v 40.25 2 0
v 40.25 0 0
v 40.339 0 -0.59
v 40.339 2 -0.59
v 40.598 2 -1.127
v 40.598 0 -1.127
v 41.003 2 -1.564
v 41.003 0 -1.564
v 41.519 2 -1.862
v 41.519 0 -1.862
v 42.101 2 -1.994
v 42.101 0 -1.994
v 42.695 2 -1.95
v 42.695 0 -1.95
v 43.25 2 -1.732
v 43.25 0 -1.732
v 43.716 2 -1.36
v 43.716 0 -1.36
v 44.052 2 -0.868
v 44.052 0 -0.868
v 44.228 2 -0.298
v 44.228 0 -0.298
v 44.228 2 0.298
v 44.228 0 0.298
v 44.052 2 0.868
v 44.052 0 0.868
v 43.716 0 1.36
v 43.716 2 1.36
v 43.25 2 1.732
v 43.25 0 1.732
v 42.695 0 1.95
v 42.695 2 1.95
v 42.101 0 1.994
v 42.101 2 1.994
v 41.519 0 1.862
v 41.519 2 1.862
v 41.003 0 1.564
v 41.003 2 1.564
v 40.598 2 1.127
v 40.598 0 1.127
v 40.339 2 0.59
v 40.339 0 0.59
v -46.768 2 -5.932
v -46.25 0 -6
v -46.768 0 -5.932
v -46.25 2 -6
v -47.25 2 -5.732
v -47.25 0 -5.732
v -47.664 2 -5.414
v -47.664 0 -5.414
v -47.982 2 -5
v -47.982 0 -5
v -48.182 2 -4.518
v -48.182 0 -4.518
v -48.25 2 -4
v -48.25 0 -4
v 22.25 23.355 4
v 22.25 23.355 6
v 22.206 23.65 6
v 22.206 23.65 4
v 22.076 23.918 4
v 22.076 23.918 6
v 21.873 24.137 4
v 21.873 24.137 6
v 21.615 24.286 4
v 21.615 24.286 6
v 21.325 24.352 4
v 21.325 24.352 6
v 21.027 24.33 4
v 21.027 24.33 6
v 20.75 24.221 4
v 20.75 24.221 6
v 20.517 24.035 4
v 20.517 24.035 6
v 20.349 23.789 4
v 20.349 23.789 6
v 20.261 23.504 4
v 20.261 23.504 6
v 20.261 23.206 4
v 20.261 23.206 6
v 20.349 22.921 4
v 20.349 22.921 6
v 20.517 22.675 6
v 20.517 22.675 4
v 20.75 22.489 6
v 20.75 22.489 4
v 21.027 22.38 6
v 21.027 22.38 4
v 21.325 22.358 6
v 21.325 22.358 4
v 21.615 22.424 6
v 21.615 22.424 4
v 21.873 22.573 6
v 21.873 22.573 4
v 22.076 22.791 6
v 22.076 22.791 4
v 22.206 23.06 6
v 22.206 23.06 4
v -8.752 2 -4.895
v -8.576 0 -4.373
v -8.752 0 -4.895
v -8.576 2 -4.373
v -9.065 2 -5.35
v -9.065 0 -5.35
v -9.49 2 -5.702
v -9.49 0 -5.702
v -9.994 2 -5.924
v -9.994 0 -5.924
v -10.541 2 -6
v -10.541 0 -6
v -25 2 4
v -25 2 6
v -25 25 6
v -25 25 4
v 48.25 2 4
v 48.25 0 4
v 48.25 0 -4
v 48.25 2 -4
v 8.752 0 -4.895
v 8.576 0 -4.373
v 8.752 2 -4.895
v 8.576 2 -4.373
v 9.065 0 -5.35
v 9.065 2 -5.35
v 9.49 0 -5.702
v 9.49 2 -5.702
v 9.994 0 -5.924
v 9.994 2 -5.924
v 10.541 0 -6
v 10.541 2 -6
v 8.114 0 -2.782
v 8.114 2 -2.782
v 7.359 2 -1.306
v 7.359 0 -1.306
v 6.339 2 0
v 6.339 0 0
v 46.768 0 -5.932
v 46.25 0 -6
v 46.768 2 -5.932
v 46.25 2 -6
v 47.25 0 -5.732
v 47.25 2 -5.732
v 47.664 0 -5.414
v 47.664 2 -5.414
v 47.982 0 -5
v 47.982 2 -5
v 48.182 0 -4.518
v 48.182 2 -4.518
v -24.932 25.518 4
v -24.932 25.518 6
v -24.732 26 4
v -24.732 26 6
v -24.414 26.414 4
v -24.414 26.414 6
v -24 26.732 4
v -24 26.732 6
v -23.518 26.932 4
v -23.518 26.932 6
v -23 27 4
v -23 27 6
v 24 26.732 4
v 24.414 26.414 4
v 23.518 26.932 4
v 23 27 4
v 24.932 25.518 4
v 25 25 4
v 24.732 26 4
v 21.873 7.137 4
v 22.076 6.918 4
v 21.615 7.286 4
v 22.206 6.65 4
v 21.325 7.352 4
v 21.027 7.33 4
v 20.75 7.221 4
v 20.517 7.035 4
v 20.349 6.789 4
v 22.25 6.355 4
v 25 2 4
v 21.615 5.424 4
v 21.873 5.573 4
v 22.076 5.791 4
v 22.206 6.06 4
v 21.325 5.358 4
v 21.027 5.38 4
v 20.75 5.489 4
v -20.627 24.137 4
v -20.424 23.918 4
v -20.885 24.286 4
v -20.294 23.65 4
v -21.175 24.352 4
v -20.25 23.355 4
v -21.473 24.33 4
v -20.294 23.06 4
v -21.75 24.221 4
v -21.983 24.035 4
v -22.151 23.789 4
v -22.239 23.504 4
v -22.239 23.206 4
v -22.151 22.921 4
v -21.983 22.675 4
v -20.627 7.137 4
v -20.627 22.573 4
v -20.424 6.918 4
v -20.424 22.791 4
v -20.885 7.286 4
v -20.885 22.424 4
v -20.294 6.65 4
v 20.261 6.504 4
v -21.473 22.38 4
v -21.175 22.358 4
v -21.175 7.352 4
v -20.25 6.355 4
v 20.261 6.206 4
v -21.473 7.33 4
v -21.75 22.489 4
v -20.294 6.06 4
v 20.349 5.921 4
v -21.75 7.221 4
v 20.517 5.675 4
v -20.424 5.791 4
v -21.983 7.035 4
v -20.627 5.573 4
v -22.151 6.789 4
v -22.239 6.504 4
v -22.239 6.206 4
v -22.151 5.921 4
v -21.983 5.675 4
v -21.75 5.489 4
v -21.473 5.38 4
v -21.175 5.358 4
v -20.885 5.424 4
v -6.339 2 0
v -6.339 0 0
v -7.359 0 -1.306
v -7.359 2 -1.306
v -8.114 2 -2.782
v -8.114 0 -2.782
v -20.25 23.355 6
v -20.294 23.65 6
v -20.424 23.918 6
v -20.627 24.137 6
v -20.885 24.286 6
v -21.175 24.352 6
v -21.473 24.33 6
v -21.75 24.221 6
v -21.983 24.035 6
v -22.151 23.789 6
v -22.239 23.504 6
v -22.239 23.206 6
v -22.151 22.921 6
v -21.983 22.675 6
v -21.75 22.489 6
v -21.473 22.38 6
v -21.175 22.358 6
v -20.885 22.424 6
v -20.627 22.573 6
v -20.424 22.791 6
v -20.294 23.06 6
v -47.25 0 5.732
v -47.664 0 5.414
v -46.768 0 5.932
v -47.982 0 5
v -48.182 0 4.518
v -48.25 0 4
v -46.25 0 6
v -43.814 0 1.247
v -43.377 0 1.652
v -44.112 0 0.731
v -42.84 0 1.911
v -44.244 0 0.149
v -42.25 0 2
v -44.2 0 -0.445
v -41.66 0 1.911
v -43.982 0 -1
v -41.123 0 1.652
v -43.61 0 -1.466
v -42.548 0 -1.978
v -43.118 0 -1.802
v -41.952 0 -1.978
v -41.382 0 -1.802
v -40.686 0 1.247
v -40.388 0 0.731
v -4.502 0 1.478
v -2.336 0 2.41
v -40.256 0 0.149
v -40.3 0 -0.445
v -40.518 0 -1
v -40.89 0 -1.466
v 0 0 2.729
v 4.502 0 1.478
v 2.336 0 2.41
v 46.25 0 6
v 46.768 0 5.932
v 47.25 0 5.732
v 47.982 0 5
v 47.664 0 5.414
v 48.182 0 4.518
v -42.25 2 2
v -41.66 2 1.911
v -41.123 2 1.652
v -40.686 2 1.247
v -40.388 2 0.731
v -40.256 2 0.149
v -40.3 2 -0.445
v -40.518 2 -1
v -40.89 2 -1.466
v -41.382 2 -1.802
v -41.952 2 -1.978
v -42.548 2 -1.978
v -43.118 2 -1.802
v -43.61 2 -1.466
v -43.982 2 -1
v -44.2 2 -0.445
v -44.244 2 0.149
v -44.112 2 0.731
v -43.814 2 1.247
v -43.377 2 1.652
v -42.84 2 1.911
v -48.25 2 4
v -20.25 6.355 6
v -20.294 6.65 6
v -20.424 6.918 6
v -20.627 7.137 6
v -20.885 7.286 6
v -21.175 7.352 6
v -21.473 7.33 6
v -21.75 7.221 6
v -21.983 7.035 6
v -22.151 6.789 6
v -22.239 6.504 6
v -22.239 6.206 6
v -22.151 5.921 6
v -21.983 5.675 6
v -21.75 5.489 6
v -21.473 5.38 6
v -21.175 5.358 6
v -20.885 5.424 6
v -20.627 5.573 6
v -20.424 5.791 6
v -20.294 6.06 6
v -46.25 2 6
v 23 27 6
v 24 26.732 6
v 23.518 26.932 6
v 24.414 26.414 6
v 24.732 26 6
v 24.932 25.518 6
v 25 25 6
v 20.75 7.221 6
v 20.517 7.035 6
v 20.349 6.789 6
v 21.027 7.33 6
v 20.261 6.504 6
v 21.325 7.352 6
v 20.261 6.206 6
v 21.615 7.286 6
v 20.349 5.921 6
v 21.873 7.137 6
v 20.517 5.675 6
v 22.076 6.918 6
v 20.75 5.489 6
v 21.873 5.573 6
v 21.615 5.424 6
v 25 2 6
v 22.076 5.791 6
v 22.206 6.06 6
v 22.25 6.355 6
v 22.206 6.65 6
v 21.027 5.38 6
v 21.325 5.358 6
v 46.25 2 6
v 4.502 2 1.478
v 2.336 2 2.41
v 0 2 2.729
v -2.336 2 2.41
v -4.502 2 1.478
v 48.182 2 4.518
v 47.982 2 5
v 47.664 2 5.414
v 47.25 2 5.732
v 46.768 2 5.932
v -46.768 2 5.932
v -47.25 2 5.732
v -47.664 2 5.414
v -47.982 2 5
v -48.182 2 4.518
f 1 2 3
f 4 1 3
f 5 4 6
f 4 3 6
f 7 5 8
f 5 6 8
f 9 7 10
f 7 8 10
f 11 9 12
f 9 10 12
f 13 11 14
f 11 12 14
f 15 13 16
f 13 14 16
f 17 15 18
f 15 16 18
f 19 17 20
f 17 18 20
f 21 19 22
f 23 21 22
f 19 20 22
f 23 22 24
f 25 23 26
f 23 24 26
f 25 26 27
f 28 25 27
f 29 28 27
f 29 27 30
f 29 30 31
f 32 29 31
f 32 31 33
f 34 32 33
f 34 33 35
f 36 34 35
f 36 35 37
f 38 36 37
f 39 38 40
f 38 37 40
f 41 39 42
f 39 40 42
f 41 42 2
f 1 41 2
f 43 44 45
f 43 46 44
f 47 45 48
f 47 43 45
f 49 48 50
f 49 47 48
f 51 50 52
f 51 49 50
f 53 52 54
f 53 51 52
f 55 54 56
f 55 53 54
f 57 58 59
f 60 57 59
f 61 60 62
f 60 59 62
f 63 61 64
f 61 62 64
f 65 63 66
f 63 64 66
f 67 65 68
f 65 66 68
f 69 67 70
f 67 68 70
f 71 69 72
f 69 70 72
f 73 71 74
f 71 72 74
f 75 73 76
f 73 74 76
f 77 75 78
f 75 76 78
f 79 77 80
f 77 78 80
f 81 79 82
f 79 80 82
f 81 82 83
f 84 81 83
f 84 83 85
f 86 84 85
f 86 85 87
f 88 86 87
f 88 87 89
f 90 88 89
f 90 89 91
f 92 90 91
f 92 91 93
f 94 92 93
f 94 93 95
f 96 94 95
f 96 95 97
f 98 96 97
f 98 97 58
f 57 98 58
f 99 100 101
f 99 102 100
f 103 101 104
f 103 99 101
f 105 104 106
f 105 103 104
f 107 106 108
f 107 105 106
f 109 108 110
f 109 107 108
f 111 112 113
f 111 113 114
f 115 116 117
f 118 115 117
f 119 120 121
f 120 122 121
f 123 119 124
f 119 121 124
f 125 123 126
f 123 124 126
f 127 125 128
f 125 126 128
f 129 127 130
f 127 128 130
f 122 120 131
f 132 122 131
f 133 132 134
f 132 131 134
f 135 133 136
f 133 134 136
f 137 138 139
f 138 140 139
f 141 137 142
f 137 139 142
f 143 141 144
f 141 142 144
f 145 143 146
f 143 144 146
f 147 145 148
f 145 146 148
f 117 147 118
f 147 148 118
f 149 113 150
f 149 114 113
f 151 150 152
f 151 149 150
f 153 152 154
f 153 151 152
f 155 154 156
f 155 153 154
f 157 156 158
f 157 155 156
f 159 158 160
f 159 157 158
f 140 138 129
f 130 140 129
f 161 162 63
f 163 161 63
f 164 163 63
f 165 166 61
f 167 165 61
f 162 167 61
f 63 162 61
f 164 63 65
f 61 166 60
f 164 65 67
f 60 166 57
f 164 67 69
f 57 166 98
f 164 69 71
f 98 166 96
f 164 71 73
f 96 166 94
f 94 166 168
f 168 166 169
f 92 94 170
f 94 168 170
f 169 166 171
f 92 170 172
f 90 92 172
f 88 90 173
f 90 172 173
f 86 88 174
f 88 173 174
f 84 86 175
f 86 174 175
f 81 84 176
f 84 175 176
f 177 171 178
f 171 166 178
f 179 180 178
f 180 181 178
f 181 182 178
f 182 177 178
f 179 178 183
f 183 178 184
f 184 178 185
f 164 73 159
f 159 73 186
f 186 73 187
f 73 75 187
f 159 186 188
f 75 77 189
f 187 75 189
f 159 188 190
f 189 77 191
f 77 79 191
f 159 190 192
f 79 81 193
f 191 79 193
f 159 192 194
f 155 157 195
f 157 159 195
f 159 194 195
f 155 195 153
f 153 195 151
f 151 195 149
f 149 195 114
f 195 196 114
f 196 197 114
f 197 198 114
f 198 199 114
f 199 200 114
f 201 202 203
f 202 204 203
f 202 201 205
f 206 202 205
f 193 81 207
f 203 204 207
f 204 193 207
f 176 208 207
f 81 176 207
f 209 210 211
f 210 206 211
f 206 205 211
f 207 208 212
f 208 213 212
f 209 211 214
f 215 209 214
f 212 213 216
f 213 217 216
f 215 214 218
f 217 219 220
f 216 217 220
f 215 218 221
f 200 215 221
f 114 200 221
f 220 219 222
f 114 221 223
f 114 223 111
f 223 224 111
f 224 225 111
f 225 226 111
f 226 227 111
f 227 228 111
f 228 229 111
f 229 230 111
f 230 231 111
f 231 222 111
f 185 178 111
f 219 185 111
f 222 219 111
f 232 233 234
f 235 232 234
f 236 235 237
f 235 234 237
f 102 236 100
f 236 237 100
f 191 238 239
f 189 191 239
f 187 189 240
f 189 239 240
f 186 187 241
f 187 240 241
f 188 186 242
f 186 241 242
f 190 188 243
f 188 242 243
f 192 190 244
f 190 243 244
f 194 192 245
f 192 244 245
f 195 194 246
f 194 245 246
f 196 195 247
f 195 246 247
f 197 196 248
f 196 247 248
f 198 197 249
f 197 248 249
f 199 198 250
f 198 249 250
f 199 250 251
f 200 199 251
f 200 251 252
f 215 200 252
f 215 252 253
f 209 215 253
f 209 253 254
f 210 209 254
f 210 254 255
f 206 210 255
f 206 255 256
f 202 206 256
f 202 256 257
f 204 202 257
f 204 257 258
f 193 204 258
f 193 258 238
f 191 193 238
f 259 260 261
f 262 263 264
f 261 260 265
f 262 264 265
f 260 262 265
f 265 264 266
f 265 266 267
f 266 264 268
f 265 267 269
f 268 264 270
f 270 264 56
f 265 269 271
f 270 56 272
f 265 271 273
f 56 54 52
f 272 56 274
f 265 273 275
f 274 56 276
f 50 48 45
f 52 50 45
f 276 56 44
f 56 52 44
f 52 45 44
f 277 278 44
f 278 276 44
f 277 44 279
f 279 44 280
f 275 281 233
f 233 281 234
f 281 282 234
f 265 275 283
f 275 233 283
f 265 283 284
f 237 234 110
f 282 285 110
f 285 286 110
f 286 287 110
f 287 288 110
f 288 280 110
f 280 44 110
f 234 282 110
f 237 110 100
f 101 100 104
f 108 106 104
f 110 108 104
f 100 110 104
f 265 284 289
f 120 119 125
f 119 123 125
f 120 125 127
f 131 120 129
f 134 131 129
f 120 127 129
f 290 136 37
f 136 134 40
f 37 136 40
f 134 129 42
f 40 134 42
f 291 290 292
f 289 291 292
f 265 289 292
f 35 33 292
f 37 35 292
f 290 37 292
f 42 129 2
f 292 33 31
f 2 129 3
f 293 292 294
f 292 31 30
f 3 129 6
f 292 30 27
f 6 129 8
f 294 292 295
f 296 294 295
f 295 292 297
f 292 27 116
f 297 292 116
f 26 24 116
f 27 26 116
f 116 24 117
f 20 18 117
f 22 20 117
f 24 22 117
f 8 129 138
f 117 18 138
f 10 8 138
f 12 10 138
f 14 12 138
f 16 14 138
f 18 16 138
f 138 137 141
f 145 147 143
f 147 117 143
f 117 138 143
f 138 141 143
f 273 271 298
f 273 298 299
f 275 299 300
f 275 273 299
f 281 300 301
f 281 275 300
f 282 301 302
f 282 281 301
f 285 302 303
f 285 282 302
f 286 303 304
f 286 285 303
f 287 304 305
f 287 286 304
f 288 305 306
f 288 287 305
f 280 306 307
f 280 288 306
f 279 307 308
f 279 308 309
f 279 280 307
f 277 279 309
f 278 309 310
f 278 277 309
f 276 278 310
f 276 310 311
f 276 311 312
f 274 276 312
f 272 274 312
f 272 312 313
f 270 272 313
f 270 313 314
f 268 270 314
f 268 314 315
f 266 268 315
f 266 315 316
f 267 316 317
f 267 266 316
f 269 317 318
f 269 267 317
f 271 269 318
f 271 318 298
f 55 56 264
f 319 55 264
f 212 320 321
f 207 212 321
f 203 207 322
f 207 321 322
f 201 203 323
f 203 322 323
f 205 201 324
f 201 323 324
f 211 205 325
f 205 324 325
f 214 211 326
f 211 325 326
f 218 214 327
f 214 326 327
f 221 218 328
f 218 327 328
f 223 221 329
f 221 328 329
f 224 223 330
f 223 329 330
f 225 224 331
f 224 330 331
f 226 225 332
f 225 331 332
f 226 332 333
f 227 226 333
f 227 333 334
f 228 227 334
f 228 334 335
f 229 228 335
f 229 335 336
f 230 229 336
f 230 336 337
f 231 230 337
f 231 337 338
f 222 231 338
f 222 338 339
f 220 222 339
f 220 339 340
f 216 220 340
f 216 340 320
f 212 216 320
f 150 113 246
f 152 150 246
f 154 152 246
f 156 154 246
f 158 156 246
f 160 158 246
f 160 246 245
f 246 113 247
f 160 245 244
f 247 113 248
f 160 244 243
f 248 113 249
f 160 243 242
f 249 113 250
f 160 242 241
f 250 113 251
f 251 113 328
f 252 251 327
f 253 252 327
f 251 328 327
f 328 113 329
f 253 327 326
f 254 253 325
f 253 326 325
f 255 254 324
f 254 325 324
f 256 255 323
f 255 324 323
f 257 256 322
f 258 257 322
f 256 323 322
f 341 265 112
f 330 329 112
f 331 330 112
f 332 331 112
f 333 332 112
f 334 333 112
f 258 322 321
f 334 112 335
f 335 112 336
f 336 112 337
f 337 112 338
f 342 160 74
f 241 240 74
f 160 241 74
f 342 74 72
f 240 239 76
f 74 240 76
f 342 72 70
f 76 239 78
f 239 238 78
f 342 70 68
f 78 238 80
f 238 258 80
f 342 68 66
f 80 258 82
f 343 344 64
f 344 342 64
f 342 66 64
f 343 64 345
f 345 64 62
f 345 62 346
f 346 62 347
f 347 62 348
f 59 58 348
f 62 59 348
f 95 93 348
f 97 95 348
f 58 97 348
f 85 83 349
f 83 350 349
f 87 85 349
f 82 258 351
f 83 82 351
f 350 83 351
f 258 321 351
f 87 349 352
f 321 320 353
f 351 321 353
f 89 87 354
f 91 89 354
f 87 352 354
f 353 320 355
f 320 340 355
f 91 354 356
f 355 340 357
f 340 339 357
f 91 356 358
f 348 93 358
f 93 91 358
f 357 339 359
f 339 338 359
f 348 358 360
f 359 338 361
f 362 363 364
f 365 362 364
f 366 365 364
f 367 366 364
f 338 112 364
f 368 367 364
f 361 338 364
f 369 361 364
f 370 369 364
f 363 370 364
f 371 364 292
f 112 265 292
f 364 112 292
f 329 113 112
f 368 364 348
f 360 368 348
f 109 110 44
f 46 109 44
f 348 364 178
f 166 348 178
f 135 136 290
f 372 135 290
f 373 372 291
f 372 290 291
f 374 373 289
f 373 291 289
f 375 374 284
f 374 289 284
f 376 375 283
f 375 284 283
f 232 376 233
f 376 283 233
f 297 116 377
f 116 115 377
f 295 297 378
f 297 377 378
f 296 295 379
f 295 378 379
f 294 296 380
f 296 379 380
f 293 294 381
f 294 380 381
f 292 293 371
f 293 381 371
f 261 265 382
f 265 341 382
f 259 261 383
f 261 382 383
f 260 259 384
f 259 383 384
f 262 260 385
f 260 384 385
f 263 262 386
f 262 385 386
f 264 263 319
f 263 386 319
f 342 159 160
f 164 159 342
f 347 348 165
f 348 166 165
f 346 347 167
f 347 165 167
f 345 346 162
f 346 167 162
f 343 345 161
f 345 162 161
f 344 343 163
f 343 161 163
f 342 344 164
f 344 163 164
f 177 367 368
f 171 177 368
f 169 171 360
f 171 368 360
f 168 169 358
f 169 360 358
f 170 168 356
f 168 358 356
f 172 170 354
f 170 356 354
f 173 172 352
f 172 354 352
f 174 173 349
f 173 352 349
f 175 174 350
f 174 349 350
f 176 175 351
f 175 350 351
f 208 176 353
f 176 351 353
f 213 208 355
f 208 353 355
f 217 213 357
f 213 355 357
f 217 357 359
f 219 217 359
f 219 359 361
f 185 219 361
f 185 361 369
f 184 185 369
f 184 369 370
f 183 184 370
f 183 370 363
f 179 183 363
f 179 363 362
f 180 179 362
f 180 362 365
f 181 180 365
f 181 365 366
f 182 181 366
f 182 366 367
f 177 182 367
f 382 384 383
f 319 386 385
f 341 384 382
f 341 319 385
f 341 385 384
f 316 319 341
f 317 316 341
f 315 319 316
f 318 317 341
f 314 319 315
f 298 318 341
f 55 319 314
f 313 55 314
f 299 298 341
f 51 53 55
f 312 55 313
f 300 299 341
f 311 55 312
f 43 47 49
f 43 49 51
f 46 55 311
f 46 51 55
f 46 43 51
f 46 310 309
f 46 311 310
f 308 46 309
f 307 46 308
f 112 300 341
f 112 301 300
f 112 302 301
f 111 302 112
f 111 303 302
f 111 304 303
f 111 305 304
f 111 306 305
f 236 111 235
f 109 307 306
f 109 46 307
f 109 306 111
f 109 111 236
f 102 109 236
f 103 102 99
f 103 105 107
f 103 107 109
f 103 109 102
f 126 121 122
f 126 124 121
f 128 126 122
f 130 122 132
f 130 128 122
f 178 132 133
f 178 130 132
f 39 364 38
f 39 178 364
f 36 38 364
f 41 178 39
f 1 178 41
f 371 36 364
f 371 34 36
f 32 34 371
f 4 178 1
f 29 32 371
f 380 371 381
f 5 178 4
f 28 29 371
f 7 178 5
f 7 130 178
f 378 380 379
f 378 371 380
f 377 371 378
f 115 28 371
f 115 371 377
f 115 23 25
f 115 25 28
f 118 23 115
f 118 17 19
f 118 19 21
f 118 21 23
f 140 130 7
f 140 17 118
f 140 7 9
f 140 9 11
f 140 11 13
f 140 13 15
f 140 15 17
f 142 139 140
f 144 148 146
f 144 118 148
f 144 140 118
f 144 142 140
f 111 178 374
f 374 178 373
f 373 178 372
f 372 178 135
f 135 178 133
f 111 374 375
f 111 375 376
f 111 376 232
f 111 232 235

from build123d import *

# Parameters (mm, degrees)
SKETCH3_R           = 2
BOSS_EXTRUDE1_DEPTH = 2
SKETCH4_W           = 25
SKETCH4_H           = 2
BOSS_EXTRUDE2_DEPTH = 25
CUT_EXTRUDE1_REACH  = 58.578
SKETCH6_R           = 1
FILLET1_R           = 2


with BuildPart() as part:
    # Sketch3 → Boss-Extrude1 (new body)
    with BuildSketch(Plane(origin=(0, 0, 0), x_dir=(1, 0, 0), z_dir=(0, 1, 0))):
        with BuildLine():
            ThreePointArc((8.728627884, 6), (8.109373095, 2.770911469), (6.339475115, 0))
            ThreePointArc((6.339475115, 0), (0, -2.728627884), (-6.339475115, 0))
            ThreePointArc((-6.339475115, 0), (-8.109373095, 2.770911469), (-8.728627884, 6))
            Line((-8.728627884, 6), (-48.25, 6))
            Line((-48.25, 6), (-48.25, -6))
            Line((-48.25, -6), (48.25, -6))
            Line((48.25, -6), (48.25, 6))
            Line((48.25, 6), (8.728627884, 6))
        make_face()
        with Locations(Location((-42.25, 0, 0), (0, 0, 270))):
            Circle(SKETCH3_R, mode=Mode.SUBTRACT)
        with BuildLine():
            ThreePointArc((44.25, 0), (42.25, -2), (40.25, 0))
            ThreePointArc((40.25, 0), (42.25, 2), (44.25, 0))
        make_face(mode=Mode.SUBTRACT)
    extrude(amount=BOSS_EXTRUDE1_DEPTH)

    # Sketch4 → Boss-Extrude2 (add)
    with BuildSketch(Plane(origin=(0, 2, 0), x_dir=(1, 0, 0), z_dir=(0, 1, 0))):
        with Locations((-12.5, -5)):
            Rectangle(SKETCH4_W, SKETCH4_H)
        with Locations((12.5, -5)):
            Rectangle(SKETCH4_W, SKETCH4_H)
    extrude(amount=BOSS_EXTRUDE2_DEPTH)

    # Sketch6 → Cut-Extrude1 (cut, up to next)
    with BuildSketch(Plane.XY.offset(6), mode=Mode.PRIVATE) as cut_extrude1_sk1:
        with Locations((21.25, 23.354759591)):
            Circle(SKETCH6_R)
    cut_extrude1_tool1 = extrude(cut_extrude1_sk1.sketch, amount=-CUT_EXTRUDE1_REACH, mode=Mode.PRIVATE) & part.part
    # Sketch6 → Cut-Extrude1 (cut, up to next)
    with BuildSketch(Plane.XY.offset(6), mode=Mode.PRIVATE) as cut_extrude1_sk2:
        with Locations((-21.25, 23.354759591)):
            Circle(SKETCH6_R)
    cut_extrude1_tool2 = extrude(cut_extrude1_sk2.sketch, amount=-CUT_EXTRUDE1_REACH, mode=Mode.PRIVATE) & part.part
    # Sketch6 → Cut-Extrude1 (cut, up to next)
    with BuildSketch(Plane.XY.offset(6), mode=Mode.PRIVATE) as cut_extrude1_sk3:
        with Locations((21.25, 6.354759591)):
            Circle(SKETCH6_R)
    cut_extrude1_tool3 = extrude(cut_extrude1_sk3.sketch, amount=-CUT_EXTRUDE1_REACH, mode=Mode.PRIVATE) & part.part
    # Sketch6 → Cut-Extrude1 (cut, up to next)
    with BuildSketch(Plane.XY.offset(6), mode=Mode.PRIVATE) as cut_extrude1_sk4:
        with Locations((-21.25, 6.354759591)):
            Circle(SKETCH6_R)
    cut_extrude1_tool4 = extrude(cut_extrude1_sk4.sketch, amount=-CUT_EXTRUDE1_REACH, mode=Mode.PRIVATE) & part.part
    add(cut_extrude1_tool1.solids().sort_by_distance((21.25, 23.35476, 6))[0], mode=Mode.SUBTRACT)
    add(cut_extrude1_tool2.solids().sort_by_distance((-21.25, 23.35476, 6))[0], mode=Mode.SUBTRACT)
    add(cut_extrude1_tool3.solids().sort_by_distance((21.25, 6.35476, 6))[0], mode=Mode.SUBTRACT)
    add(cut_extrude1_tool4.solids().sort_by_distance((-21.25, 6.35476, 6))[0], mode=Mode.SUBTRACT)

    # Fillet1
    fillet1_edges = [part.edges().sort_by_distance(p)[0] for p in [
        (8.728627884, 1, -6),
        (48.25, 1, -6),
        (48.25, 1, 6),
        (-48.25, 1, 6),
        (-48.25, 1, -6),
        (-8.728627884, 1, -6),
        (25, 27, 5),
        (-25, 27, 5),
    ]]
    fillet(fillet1_edges, radius=FILLET1_R)


solid = part.part
